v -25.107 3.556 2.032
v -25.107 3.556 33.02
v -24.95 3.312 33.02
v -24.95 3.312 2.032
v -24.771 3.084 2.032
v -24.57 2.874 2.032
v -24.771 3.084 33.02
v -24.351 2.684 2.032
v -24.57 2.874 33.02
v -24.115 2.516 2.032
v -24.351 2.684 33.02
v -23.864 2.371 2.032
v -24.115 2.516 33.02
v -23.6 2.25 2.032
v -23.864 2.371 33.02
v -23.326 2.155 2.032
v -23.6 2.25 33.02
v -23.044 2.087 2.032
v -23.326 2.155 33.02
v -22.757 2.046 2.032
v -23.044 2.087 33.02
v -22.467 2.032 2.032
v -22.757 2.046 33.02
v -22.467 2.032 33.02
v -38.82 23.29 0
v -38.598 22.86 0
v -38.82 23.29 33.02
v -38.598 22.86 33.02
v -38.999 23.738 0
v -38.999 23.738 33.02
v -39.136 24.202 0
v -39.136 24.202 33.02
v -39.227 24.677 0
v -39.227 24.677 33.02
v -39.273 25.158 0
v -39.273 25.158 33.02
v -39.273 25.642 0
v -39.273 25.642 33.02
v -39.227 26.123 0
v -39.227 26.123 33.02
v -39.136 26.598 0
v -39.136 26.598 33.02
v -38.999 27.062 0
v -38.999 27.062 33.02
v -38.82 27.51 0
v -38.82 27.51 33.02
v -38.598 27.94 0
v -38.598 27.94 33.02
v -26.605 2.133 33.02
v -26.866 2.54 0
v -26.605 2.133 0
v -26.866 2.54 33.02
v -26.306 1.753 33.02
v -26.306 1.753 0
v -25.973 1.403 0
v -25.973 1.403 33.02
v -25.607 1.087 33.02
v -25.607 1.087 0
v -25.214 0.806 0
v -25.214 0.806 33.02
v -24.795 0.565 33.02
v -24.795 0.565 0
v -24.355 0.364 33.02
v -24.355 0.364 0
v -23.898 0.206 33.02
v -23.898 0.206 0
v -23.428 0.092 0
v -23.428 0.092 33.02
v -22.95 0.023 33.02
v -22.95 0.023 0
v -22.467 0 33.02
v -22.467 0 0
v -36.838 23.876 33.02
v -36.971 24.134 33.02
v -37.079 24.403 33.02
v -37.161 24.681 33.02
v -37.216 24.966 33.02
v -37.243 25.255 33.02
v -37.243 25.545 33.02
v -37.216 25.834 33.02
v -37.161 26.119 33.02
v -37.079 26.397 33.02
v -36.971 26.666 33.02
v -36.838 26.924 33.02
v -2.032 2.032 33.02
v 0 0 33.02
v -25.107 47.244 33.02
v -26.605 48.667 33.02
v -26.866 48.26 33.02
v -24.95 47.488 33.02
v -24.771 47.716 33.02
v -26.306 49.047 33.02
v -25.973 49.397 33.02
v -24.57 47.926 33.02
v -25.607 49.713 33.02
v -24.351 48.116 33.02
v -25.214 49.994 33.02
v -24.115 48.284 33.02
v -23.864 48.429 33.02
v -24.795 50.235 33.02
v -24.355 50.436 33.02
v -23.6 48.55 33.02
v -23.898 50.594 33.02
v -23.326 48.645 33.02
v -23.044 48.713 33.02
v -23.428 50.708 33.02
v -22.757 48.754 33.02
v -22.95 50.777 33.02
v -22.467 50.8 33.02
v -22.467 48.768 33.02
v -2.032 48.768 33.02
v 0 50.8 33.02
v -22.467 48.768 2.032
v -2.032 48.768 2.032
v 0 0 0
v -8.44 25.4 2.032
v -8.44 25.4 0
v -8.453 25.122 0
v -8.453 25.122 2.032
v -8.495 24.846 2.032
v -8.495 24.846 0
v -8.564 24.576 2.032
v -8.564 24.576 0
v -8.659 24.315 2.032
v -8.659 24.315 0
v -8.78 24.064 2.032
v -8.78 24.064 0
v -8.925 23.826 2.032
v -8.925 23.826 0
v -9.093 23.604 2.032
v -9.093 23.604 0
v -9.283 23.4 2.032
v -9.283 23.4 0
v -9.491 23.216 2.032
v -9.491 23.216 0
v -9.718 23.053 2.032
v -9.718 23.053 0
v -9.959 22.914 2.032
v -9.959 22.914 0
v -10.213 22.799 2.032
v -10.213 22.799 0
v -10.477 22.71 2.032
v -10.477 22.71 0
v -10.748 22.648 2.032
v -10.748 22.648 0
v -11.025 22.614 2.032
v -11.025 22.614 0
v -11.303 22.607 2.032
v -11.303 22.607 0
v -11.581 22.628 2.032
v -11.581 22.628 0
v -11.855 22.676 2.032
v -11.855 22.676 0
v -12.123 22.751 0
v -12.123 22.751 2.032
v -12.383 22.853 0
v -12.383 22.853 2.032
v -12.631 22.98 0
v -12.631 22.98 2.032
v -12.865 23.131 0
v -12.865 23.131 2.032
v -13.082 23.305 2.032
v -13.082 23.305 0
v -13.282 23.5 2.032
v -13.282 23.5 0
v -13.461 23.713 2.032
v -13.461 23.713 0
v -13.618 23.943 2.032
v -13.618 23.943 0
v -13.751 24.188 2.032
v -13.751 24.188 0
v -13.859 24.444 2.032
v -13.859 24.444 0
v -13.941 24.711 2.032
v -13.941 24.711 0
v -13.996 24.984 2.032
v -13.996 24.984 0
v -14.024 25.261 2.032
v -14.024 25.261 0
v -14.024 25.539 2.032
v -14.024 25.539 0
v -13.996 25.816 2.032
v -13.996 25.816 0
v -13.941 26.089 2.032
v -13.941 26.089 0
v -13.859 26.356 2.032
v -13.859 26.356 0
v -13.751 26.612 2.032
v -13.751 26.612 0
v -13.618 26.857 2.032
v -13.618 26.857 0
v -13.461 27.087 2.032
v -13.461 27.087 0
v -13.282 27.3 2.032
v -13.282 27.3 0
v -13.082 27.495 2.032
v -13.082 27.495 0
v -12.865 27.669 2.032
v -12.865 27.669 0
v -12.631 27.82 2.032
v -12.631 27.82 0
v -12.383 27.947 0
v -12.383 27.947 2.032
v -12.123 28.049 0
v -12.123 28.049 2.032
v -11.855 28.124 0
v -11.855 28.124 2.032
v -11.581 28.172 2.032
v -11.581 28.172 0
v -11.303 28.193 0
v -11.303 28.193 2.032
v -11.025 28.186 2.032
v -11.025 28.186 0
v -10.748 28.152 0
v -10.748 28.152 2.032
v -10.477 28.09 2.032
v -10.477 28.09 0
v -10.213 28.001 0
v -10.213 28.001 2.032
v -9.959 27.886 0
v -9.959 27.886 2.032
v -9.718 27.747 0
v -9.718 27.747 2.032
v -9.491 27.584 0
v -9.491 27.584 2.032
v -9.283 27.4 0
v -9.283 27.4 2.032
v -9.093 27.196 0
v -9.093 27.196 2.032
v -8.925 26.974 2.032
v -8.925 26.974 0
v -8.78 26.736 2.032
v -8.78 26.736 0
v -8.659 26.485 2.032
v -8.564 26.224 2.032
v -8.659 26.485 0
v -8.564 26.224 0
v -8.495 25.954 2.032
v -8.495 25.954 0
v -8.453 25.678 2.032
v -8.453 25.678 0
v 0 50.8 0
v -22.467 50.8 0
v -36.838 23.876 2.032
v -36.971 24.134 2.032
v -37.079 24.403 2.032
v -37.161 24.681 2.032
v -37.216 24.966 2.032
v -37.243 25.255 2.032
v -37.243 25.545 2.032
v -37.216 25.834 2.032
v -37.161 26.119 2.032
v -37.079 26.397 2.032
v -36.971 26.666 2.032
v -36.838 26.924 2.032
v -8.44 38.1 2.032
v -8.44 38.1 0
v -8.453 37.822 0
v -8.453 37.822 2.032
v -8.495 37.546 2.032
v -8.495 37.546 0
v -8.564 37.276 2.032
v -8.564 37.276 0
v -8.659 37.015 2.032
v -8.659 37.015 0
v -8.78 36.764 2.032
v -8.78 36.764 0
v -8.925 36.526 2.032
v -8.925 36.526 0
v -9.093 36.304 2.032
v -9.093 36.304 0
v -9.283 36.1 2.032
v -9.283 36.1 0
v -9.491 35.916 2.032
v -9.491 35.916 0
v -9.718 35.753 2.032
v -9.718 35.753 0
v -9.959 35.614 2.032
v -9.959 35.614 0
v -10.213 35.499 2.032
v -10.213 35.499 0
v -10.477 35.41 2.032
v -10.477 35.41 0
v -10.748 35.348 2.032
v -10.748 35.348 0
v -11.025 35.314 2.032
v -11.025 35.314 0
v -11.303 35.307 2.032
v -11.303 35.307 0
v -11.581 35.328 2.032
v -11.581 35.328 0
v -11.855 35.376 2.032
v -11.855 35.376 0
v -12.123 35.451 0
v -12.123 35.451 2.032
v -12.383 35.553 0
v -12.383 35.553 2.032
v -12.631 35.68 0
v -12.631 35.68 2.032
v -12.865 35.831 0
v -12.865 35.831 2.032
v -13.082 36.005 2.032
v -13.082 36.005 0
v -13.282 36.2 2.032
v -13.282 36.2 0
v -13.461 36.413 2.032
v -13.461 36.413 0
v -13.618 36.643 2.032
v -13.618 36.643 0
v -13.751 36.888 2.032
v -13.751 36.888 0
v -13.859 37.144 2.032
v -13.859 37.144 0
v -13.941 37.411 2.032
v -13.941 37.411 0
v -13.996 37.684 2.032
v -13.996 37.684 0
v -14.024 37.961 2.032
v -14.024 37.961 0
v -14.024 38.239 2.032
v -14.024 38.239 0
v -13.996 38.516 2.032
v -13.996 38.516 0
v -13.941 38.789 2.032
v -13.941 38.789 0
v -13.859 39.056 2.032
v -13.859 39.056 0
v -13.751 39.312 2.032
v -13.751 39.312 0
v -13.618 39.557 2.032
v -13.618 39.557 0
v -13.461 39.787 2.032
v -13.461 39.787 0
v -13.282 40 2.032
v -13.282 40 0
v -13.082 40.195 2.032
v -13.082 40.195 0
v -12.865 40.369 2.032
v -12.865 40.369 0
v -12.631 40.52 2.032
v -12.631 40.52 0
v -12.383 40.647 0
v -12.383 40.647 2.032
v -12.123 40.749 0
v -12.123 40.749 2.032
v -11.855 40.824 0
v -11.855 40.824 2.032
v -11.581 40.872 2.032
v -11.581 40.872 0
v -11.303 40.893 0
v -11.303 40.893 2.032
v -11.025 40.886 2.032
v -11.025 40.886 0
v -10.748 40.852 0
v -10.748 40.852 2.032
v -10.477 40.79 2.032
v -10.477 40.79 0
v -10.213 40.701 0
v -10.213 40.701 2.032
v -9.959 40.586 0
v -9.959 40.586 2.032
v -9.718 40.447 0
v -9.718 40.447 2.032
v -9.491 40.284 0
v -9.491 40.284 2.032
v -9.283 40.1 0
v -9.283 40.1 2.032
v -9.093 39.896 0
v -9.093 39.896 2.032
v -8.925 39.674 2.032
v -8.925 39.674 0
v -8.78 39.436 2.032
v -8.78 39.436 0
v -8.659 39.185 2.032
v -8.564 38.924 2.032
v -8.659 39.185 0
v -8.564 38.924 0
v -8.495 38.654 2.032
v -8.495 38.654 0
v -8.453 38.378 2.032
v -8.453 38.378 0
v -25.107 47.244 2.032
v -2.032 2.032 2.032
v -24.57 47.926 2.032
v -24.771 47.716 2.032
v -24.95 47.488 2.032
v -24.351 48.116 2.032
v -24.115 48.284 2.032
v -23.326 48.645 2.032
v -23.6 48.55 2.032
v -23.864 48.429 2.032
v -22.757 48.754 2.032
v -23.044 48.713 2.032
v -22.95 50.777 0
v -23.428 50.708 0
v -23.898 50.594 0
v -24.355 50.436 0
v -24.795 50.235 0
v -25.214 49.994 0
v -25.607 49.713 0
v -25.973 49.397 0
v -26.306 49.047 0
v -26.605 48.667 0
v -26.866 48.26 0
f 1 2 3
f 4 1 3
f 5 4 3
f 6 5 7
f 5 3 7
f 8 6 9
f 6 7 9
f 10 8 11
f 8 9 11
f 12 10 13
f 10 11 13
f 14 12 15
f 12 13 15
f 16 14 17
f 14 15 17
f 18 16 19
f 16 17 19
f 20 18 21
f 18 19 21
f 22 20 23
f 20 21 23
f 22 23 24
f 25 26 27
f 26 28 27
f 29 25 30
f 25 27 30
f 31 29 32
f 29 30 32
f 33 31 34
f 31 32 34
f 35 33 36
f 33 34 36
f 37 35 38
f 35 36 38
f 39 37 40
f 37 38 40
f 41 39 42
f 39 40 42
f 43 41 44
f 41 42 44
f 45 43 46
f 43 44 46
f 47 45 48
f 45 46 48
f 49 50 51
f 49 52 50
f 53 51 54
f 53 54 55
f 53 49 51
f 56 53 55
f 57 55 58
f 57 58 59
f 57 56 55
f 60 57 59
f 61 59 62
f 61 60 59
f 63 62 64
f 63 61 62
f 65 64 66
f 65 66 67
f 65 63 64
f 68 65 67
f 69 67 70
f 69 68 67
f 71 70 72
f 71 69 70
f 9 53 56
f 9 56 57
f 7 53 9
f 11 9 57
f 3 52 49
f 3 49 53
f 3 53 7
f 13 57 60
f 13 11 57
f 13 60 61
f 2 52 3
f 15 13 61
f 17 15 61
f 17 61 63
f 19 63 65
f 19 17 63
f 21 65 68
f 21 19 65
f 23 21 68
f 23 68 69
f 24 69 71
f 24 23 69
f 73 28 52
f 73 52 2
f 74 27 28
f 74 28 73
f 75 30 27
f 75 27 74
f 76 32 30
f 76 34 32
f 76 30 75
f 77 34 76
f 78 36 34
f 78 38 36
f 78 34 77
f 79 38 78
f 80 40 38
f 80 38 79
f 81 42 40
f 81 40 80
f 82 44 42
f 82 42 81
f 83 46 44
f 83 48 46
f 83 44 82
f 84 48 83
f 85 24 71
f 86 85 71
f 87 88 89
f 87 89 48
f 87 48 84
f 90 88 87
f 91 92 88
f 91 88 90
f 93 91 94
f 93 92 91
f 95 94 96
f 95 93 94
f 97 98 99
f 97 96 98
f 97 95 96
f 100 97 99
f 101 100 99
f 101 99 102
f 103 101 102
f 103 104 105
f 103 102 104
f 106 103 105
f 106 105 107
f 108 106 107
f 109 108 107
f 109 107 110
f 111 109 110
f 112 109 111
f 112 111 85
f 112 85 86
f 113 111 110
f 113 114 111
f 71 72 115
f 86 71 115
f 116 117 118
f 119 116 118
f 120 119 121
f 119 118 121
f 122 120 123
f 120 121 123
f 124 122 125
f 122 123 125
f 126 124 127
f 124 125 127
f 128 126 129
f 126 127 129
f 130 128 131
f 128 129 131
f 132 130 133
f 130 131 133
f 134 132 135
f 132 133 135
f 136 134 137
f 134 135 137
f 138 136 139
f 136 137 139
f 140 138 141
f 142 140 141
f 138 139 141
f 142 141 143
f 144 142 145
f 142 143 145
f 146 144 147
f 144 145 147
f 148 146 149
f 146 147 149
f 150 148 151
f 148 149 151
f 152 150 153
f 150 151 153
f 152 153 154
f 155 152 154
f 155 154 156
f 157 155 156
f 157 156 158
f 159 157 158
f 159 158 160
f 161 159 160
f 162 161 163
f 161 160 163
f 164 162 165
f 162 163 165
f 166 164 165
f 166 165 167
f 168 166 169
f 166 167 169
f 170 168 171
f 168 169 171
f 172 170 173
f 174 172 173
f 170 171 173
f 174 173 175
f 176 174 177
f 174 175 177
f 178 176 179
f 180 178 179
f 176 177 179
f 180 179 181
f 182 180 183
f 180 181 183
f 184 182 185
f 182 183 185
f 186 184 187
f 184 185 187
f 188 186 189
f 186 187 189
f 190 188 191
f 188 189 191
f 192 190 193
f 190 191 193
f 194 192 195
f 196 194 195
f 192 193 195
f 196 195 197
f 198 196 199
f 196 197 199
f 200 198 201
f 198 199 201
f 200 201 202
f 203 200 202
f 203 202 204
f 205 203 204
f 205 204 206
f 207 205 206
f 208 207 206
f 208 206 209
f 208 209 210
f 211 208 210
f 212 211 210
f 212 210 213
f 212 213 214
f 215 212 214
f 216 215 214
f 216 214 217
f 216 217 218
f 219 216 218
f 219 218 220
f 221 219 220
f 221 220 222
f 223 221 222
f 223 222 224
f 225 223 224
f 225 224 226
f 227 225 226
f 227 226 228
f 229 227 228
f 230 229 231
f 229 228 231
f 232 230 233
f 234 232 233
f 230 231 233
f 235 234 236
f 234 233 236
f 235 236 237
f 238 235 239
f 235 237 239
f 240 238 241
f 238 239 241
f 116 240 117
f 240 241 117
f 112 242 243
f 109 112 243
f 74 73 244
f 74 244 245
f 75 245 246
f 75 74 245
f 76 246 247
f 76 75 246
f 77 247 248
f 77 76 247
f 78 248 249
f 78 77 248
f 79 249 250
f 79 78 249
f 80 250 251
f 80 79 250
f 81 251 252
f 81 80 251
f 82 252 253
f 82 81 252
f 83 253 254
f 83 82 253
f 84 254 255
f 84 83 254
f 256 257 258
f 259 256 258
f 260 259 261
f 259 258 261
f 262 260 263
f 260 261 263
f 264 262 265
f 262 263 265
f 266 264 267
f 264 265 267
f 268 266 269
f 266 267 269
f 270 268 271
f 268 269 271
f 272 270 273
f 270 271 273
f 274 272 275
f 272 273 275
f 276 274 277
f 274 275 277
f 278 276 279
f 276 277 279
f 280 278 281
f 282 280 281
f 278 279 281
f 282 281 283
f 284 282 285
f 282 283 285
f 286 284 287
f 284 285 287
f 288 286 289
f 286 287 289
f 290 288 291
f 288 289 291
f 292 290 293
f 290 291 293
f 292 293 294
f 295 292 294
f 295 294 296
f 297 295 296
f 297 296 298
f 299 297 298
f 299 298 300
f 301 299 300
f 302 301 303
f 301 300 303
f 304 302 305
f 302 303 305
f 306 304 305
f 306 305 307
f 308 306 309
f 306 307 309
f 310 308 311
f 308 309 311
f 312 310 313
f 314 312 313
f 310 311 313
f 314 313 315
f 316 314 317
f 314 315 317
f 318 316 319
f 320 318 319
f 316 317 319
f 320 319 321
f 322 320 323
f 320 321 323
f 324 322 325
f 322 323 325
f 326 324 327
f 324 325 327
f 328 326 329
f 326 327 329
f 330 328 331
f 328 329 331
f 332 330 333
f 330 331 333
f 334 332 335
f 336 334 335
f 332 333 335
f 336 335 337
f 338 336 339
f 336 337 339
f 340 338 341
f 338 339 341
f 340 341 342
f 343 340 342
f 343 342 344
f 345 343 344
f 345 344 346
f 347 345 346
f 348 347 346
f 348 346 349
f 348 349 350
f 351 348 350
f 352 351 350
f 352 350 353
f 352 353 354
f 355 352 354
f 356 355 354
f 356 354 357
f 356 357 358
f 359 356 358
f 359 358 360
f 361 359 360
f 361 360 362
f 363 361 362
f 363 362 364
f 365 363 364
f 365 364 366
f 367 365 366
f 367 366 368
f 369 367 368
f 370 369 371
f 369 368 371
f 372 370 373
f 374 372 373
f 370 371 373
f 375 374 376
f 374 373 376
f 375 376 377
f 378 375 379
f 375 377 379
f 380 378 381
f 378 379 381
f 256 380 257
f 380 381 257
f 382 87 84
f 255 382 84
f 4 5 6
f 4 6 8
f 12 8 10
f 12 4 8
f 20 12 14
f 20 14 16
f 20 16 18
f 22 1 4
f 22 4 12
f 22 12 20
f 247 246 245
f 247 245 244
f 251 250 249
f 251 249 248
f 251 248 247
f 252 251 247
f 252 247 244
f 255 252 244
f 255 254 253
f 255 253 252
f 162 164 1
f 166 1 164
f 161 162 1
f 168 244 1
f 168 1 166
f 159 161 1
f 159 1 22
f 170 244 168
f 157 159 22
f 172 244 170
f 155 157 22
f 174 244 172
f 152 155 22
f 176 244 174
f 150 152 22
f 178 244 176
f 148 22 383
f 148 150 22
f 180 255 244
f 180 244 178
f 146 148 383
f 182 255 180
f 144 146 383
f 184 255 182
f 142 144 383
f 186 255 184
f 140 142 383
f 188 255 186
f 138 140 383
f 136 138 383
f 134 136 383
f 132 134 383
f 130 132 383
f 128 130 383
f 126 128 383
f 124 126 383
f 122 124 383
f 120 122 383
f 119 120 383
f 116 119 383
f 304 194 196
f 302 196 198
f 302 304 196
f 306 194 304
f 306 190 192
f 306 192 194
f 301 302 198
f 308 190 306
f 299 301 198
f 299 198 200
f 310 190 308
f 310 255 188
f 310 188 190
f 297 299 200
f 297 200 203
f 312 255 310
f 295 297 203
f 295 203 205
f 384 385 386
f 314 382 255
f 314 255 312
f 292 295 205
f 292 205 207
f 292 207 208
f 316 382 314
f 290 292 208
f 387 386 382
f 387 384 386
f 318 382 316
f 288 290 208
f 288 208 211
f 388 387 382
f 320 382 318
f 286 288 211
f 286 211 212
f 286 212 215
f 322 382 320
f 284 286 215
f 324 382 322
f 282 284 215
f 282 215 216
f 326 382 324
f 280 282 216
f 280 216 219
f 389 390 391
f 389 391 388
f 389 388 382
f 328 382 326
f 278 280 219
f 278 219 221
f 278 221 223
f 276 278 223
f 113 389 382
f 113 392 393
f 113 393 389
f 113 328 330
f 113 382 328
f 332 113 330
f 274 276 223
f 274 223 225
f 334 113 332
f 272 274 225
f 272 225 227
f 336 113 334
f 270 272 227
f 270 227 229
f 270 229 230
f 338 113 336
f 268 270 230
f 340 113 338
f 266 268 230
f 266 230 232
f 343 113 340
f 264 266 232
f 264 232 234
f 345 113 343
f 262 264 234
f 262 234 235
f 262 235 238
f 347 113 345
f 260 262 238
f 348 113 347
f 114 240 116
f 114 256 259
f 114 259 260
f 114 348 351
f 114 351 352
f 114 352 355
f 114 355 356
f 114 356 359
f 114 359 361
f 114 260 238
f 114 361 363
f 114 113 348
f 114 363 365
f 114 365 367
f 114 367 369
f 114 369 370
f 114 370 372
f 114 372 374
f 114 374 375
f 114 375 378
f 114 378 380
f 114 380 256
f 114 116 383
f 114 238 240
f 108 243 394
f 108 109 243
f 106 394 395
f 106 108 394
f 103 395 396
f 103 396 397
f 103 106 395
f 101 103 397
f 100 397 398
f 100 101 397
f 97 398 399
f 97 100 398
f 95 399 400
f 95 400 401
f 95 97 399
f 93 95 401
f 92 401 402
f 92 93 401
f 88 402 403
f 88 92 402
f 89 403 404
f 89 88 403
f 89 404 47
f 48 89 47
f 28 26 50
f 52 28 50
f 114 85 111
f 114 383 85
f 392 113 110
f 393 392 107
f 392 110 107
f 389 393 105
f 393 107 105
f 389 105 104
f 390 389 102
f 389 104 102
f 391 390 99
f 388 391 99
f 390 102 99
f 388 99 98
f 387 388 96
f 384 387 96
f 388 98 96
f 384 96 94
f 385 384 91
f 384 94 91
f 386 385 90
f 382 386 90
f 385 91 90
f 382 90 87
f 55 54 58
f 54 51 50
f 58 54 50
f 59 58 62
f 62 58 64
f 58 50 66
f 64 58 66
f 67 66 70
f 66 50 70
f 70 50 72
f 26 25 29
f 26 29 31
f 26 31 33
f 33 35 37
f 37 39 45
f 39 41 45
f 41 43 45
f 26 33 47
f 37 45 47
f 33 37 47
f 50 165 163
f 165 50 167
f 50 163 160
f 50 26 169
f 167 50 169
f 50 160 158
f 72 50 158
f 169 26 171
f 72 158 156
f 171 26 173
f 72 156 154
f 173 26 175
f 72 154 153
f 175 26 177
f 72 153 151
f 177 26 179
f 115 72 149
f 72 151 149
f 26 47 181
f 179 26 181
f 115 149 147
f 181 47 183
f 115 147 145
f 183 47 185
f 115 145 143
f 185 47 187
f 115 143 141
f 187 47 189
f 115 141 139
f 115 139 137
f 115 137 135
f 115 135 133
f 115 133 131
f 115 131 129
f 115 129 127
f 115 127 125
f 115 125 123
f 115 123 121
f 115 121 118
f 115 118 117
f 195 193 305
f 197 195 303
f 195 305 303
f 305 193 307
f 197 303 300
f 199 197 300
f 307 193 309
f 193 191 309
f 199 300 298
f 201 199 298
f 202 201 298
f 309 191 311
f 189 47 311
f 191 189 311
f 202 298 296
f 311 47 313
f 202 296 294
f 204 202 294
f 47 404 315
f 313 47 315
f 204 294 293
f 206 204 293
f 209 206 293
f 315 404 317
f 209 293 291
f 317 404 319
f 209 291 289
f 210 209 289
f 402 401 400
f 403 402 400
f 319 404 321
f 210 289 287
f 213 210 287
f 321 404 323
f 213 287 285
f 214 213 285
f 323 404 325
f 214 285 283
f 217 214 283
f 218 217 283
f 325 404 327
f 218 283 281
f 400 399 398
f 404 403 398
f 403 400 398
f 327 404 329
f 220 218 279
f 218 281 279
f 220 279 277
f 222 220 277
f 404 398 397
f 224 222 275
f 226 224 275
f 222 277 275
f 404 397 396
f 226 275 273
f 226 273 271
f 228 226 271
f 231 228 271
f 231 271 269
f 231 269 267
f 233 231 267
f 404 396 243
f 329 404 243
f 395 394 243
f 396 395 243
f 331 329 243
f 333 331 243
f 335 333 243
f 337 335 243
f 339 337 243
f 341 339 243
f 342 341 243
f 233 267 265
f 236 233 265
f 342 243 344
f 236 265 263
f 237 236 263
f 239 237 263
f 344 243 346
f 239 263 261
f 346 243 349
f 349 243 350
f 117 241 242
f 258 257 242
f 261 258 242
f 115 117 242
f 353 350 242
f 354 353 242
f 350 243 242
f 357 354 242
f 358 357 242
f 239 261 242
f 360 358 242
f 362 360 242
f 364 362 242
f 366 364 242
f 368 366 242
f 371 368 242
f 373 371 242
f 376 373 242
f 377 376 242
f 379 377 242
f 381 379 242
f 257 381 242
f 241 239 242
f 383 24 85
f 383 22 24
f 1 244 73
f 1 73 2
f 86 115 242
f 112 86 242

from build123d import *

# Parameters (mm, degrees)
F1_DEPTH = 33.02
F2_R     = 5.08
F4_T     = -2.032
F3_R     = 2.794
F5_DEPTH = 2.032


with BuildPart() as f1:
    # F0 (on Top) → F1 (new body)
    with BuildSketch(Plane.XY):
        Polygon((-40.064697, 25.4), (-25.4, 0), (-25.4, 25.4), align=None)
        Polygon((-40.064697, 25.4), (-25.4, 25.4), (-25.4, 50.8), align=None)
        Polygon((-25.4, 0), (0, 0), (0, 50.8), (-25.4, 50.8), (-25.4, 25.4), align=None)
    extrude(amount=F1_DEPTH)

    # F2
    f2_edges = [f1.edges().sort_by_distance(p)[0] for p in [
        (-40.064697, 25.4, 16.51),
        (-25.4, 50.8, 16.51),
        (-25.4, 0, 16.51),
    ]]
    fillet(f2_edges, radius=F2_R)

    # F4
    f4_openings = [f1.faces().sort_by_distance(p)[0] for p in [
        (-16.606713, 25.4, 33.02),
    ]]
    offset(amount=F4_T, openings=f4_openings)

    # F3 (on face) → F5 (cut)
    with BuildSketch(Plane(origin=(0, 0, 0), x_dir=(1, 0, 0), z_dir=(0, 0, -1))):
        with Locations((-11.23353, -25.4)):
            Circle(F3_R)
        with Locations((-11.23353, -38.1)):
            Circle(F3_R)
    extrude(amount=-F5_DEPTH, mode=Mode.SUBTRACT)


solid = f1.part
